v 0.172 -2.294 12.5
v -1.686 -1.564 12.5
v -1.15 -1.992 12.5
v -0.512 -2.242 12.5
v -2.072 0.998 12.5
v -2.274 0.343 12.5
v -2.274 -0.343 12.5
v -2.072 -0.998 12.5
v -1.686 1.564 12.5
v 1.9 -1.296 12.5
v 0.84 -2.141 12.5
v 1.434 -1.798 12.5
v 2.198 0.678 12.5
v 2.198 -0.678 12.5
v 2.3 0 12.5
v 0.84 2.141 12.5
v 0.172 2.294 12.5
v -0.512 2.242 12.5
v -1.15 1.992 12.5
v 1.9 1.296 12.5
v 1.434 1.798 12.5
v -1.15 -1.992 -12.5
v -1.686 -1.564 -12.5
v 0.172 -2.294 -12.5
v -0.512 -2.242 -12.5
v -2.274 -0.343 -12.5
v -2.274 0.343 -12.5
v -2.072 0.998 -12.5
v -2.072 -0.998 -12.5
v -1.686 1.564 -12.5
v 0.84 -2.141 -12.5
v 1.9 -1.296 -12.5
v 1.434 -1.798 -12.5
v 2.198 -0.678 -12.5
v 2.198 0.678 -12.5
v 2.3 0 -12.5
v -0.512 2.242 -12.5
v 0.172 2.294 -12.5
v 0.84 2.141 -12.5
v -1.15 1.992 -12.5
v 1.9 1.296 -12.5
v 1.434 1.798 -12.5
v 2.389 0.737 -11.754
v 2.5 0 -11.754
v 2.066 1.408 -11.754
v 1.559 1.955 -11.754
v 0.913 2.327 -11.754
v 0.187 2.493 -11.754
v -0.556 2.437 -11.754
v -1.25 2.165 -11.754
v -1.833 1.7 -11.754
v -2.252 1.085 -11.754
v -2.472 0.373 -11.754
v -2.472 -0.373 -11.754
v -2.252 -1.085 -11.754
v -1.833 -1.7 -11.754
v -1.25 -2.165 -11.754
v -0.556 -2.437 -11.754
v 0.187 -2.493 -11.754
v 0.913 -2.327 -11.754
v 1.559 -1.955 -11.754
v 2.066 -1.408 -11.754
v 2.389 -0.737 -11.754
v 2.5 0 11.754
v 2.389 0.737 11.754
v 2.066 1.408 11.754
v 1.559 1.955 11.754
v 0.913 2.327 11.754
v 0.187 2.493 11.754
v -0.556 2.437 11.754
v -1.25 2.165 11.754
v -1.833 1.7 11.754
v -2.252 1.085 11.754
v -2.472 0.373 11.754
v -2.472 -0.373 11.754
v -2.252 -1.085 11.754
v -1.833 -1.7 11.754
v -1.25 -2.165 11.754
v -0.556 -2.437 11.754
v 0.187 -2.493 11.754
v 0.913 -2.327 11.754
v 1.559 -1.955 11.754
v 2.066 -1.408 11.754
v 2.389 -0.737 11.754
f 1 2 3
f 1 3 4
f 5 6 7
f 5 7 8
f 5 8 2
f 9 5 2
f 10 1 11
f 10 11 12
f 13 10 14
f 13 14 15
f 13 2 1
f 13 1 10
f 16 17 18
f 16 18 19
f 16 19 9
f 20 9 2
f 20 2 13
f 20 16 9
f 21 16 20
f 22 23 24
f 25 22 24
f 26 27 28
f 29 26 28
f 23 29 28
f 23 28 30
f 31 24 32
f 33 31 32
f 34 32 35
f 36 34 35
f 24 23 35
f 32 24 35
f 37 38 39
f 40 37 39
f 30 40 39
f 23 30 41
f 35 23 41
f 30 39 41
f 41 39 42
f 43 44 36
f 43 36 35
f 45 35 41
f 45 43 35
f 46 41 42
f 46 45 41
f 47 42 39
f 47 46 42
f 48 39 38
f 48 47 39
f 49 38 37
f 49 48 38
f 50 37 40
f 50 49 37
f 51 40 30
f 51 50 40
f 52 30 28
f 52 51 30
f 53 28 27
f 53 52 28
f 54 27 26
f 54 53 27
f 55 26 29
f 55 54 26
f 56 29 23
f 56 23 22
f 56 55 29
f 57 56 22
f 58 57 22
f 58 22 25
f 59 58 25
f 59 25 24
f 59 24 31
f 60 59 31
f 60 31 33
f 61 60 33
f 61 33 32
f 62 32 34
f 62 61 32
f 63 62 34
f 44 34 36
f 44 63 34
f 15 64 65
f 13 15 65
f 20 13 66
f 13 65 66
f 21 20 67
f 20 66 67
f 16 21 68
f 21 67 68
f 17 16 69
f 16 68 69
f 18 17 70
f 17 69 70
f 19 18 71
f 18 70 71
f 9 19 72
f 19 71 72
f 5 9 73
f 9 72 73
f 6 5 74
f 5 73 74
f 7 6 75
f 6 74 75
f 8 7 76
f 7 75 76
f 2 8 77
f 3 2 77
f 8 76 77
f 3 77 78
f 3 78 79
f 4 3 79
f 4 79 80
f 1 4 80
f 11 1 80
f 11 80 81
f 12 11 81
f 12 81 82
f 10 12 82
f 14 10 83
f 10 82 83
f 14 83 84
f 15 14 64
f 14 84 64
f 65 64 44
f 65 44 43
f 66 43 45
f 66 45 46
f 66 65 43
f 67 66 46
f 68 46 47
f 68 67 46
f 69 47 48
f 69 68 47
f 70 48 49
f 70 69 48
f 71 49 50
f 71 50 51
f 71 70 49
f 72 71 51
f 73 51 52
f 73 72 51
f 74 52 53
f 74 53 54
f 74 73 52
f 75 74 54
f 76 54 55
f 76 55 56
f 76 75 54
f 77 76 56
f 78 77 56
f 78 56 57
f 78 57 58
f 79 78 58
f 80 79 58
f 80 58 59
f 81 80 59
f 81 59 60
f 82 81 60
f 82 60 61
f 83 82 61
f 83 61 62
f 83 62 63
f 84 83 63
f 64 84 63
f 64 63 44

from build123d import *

# Parameters (mm, degrees)
SKETCH_1_R      = 2.5
EXTRUDE_1_DEPTH = 12.5
CHAMFER_1_SIZE  = 0.2
CHAMFER_1_SIZE2 = 0.746410162
CHAMFER_2_SIZE  = 0.2
CHAMFER_2_SIZE2 = 0.746410162


with BuildPart() as part:
    # 草图1 → 凸台-拉伸1 (new, symmetric)
    with BuildSketch(Plane.XY):
        Circle(SKETCH_1_R)
    extrude(amount=EXTRUDE_1_DEPTH, both=True)

    # 倒角1
    chamfer_1_edges = [part.edges().sort_by_distance(p)[0] for p in [
        (-2.5, 0, 12.5),
    ]]
    chamfer_1_side = [part.faces().sort_by_distance(p)[0] for p in [
        (0, 0, 12.5),
    ]]
    chamfer(chamfer_1_edges, length=CHAMFER_1_SIZE, length2=CHAMFER_1_SIZE2, reference=chamfer_1_side[0])

    # 倒角2
    chamfer_2_edges = [part.edges().sort_by_distance(p)[0] for p in [
        (-2.5, 0, -12.5),
    ]]
    chamfer_2_side = [part.faces().sort_by_distance(p)[0] for p in [
        (0, 0, -12.5),
    ]]
    chamfer(chamfer_2_edges, length=CHAMFER_2_SIZE, length2=CHAMFER_2_SIZE2, reference=chamfer_2_side[0])


solid = part.part
